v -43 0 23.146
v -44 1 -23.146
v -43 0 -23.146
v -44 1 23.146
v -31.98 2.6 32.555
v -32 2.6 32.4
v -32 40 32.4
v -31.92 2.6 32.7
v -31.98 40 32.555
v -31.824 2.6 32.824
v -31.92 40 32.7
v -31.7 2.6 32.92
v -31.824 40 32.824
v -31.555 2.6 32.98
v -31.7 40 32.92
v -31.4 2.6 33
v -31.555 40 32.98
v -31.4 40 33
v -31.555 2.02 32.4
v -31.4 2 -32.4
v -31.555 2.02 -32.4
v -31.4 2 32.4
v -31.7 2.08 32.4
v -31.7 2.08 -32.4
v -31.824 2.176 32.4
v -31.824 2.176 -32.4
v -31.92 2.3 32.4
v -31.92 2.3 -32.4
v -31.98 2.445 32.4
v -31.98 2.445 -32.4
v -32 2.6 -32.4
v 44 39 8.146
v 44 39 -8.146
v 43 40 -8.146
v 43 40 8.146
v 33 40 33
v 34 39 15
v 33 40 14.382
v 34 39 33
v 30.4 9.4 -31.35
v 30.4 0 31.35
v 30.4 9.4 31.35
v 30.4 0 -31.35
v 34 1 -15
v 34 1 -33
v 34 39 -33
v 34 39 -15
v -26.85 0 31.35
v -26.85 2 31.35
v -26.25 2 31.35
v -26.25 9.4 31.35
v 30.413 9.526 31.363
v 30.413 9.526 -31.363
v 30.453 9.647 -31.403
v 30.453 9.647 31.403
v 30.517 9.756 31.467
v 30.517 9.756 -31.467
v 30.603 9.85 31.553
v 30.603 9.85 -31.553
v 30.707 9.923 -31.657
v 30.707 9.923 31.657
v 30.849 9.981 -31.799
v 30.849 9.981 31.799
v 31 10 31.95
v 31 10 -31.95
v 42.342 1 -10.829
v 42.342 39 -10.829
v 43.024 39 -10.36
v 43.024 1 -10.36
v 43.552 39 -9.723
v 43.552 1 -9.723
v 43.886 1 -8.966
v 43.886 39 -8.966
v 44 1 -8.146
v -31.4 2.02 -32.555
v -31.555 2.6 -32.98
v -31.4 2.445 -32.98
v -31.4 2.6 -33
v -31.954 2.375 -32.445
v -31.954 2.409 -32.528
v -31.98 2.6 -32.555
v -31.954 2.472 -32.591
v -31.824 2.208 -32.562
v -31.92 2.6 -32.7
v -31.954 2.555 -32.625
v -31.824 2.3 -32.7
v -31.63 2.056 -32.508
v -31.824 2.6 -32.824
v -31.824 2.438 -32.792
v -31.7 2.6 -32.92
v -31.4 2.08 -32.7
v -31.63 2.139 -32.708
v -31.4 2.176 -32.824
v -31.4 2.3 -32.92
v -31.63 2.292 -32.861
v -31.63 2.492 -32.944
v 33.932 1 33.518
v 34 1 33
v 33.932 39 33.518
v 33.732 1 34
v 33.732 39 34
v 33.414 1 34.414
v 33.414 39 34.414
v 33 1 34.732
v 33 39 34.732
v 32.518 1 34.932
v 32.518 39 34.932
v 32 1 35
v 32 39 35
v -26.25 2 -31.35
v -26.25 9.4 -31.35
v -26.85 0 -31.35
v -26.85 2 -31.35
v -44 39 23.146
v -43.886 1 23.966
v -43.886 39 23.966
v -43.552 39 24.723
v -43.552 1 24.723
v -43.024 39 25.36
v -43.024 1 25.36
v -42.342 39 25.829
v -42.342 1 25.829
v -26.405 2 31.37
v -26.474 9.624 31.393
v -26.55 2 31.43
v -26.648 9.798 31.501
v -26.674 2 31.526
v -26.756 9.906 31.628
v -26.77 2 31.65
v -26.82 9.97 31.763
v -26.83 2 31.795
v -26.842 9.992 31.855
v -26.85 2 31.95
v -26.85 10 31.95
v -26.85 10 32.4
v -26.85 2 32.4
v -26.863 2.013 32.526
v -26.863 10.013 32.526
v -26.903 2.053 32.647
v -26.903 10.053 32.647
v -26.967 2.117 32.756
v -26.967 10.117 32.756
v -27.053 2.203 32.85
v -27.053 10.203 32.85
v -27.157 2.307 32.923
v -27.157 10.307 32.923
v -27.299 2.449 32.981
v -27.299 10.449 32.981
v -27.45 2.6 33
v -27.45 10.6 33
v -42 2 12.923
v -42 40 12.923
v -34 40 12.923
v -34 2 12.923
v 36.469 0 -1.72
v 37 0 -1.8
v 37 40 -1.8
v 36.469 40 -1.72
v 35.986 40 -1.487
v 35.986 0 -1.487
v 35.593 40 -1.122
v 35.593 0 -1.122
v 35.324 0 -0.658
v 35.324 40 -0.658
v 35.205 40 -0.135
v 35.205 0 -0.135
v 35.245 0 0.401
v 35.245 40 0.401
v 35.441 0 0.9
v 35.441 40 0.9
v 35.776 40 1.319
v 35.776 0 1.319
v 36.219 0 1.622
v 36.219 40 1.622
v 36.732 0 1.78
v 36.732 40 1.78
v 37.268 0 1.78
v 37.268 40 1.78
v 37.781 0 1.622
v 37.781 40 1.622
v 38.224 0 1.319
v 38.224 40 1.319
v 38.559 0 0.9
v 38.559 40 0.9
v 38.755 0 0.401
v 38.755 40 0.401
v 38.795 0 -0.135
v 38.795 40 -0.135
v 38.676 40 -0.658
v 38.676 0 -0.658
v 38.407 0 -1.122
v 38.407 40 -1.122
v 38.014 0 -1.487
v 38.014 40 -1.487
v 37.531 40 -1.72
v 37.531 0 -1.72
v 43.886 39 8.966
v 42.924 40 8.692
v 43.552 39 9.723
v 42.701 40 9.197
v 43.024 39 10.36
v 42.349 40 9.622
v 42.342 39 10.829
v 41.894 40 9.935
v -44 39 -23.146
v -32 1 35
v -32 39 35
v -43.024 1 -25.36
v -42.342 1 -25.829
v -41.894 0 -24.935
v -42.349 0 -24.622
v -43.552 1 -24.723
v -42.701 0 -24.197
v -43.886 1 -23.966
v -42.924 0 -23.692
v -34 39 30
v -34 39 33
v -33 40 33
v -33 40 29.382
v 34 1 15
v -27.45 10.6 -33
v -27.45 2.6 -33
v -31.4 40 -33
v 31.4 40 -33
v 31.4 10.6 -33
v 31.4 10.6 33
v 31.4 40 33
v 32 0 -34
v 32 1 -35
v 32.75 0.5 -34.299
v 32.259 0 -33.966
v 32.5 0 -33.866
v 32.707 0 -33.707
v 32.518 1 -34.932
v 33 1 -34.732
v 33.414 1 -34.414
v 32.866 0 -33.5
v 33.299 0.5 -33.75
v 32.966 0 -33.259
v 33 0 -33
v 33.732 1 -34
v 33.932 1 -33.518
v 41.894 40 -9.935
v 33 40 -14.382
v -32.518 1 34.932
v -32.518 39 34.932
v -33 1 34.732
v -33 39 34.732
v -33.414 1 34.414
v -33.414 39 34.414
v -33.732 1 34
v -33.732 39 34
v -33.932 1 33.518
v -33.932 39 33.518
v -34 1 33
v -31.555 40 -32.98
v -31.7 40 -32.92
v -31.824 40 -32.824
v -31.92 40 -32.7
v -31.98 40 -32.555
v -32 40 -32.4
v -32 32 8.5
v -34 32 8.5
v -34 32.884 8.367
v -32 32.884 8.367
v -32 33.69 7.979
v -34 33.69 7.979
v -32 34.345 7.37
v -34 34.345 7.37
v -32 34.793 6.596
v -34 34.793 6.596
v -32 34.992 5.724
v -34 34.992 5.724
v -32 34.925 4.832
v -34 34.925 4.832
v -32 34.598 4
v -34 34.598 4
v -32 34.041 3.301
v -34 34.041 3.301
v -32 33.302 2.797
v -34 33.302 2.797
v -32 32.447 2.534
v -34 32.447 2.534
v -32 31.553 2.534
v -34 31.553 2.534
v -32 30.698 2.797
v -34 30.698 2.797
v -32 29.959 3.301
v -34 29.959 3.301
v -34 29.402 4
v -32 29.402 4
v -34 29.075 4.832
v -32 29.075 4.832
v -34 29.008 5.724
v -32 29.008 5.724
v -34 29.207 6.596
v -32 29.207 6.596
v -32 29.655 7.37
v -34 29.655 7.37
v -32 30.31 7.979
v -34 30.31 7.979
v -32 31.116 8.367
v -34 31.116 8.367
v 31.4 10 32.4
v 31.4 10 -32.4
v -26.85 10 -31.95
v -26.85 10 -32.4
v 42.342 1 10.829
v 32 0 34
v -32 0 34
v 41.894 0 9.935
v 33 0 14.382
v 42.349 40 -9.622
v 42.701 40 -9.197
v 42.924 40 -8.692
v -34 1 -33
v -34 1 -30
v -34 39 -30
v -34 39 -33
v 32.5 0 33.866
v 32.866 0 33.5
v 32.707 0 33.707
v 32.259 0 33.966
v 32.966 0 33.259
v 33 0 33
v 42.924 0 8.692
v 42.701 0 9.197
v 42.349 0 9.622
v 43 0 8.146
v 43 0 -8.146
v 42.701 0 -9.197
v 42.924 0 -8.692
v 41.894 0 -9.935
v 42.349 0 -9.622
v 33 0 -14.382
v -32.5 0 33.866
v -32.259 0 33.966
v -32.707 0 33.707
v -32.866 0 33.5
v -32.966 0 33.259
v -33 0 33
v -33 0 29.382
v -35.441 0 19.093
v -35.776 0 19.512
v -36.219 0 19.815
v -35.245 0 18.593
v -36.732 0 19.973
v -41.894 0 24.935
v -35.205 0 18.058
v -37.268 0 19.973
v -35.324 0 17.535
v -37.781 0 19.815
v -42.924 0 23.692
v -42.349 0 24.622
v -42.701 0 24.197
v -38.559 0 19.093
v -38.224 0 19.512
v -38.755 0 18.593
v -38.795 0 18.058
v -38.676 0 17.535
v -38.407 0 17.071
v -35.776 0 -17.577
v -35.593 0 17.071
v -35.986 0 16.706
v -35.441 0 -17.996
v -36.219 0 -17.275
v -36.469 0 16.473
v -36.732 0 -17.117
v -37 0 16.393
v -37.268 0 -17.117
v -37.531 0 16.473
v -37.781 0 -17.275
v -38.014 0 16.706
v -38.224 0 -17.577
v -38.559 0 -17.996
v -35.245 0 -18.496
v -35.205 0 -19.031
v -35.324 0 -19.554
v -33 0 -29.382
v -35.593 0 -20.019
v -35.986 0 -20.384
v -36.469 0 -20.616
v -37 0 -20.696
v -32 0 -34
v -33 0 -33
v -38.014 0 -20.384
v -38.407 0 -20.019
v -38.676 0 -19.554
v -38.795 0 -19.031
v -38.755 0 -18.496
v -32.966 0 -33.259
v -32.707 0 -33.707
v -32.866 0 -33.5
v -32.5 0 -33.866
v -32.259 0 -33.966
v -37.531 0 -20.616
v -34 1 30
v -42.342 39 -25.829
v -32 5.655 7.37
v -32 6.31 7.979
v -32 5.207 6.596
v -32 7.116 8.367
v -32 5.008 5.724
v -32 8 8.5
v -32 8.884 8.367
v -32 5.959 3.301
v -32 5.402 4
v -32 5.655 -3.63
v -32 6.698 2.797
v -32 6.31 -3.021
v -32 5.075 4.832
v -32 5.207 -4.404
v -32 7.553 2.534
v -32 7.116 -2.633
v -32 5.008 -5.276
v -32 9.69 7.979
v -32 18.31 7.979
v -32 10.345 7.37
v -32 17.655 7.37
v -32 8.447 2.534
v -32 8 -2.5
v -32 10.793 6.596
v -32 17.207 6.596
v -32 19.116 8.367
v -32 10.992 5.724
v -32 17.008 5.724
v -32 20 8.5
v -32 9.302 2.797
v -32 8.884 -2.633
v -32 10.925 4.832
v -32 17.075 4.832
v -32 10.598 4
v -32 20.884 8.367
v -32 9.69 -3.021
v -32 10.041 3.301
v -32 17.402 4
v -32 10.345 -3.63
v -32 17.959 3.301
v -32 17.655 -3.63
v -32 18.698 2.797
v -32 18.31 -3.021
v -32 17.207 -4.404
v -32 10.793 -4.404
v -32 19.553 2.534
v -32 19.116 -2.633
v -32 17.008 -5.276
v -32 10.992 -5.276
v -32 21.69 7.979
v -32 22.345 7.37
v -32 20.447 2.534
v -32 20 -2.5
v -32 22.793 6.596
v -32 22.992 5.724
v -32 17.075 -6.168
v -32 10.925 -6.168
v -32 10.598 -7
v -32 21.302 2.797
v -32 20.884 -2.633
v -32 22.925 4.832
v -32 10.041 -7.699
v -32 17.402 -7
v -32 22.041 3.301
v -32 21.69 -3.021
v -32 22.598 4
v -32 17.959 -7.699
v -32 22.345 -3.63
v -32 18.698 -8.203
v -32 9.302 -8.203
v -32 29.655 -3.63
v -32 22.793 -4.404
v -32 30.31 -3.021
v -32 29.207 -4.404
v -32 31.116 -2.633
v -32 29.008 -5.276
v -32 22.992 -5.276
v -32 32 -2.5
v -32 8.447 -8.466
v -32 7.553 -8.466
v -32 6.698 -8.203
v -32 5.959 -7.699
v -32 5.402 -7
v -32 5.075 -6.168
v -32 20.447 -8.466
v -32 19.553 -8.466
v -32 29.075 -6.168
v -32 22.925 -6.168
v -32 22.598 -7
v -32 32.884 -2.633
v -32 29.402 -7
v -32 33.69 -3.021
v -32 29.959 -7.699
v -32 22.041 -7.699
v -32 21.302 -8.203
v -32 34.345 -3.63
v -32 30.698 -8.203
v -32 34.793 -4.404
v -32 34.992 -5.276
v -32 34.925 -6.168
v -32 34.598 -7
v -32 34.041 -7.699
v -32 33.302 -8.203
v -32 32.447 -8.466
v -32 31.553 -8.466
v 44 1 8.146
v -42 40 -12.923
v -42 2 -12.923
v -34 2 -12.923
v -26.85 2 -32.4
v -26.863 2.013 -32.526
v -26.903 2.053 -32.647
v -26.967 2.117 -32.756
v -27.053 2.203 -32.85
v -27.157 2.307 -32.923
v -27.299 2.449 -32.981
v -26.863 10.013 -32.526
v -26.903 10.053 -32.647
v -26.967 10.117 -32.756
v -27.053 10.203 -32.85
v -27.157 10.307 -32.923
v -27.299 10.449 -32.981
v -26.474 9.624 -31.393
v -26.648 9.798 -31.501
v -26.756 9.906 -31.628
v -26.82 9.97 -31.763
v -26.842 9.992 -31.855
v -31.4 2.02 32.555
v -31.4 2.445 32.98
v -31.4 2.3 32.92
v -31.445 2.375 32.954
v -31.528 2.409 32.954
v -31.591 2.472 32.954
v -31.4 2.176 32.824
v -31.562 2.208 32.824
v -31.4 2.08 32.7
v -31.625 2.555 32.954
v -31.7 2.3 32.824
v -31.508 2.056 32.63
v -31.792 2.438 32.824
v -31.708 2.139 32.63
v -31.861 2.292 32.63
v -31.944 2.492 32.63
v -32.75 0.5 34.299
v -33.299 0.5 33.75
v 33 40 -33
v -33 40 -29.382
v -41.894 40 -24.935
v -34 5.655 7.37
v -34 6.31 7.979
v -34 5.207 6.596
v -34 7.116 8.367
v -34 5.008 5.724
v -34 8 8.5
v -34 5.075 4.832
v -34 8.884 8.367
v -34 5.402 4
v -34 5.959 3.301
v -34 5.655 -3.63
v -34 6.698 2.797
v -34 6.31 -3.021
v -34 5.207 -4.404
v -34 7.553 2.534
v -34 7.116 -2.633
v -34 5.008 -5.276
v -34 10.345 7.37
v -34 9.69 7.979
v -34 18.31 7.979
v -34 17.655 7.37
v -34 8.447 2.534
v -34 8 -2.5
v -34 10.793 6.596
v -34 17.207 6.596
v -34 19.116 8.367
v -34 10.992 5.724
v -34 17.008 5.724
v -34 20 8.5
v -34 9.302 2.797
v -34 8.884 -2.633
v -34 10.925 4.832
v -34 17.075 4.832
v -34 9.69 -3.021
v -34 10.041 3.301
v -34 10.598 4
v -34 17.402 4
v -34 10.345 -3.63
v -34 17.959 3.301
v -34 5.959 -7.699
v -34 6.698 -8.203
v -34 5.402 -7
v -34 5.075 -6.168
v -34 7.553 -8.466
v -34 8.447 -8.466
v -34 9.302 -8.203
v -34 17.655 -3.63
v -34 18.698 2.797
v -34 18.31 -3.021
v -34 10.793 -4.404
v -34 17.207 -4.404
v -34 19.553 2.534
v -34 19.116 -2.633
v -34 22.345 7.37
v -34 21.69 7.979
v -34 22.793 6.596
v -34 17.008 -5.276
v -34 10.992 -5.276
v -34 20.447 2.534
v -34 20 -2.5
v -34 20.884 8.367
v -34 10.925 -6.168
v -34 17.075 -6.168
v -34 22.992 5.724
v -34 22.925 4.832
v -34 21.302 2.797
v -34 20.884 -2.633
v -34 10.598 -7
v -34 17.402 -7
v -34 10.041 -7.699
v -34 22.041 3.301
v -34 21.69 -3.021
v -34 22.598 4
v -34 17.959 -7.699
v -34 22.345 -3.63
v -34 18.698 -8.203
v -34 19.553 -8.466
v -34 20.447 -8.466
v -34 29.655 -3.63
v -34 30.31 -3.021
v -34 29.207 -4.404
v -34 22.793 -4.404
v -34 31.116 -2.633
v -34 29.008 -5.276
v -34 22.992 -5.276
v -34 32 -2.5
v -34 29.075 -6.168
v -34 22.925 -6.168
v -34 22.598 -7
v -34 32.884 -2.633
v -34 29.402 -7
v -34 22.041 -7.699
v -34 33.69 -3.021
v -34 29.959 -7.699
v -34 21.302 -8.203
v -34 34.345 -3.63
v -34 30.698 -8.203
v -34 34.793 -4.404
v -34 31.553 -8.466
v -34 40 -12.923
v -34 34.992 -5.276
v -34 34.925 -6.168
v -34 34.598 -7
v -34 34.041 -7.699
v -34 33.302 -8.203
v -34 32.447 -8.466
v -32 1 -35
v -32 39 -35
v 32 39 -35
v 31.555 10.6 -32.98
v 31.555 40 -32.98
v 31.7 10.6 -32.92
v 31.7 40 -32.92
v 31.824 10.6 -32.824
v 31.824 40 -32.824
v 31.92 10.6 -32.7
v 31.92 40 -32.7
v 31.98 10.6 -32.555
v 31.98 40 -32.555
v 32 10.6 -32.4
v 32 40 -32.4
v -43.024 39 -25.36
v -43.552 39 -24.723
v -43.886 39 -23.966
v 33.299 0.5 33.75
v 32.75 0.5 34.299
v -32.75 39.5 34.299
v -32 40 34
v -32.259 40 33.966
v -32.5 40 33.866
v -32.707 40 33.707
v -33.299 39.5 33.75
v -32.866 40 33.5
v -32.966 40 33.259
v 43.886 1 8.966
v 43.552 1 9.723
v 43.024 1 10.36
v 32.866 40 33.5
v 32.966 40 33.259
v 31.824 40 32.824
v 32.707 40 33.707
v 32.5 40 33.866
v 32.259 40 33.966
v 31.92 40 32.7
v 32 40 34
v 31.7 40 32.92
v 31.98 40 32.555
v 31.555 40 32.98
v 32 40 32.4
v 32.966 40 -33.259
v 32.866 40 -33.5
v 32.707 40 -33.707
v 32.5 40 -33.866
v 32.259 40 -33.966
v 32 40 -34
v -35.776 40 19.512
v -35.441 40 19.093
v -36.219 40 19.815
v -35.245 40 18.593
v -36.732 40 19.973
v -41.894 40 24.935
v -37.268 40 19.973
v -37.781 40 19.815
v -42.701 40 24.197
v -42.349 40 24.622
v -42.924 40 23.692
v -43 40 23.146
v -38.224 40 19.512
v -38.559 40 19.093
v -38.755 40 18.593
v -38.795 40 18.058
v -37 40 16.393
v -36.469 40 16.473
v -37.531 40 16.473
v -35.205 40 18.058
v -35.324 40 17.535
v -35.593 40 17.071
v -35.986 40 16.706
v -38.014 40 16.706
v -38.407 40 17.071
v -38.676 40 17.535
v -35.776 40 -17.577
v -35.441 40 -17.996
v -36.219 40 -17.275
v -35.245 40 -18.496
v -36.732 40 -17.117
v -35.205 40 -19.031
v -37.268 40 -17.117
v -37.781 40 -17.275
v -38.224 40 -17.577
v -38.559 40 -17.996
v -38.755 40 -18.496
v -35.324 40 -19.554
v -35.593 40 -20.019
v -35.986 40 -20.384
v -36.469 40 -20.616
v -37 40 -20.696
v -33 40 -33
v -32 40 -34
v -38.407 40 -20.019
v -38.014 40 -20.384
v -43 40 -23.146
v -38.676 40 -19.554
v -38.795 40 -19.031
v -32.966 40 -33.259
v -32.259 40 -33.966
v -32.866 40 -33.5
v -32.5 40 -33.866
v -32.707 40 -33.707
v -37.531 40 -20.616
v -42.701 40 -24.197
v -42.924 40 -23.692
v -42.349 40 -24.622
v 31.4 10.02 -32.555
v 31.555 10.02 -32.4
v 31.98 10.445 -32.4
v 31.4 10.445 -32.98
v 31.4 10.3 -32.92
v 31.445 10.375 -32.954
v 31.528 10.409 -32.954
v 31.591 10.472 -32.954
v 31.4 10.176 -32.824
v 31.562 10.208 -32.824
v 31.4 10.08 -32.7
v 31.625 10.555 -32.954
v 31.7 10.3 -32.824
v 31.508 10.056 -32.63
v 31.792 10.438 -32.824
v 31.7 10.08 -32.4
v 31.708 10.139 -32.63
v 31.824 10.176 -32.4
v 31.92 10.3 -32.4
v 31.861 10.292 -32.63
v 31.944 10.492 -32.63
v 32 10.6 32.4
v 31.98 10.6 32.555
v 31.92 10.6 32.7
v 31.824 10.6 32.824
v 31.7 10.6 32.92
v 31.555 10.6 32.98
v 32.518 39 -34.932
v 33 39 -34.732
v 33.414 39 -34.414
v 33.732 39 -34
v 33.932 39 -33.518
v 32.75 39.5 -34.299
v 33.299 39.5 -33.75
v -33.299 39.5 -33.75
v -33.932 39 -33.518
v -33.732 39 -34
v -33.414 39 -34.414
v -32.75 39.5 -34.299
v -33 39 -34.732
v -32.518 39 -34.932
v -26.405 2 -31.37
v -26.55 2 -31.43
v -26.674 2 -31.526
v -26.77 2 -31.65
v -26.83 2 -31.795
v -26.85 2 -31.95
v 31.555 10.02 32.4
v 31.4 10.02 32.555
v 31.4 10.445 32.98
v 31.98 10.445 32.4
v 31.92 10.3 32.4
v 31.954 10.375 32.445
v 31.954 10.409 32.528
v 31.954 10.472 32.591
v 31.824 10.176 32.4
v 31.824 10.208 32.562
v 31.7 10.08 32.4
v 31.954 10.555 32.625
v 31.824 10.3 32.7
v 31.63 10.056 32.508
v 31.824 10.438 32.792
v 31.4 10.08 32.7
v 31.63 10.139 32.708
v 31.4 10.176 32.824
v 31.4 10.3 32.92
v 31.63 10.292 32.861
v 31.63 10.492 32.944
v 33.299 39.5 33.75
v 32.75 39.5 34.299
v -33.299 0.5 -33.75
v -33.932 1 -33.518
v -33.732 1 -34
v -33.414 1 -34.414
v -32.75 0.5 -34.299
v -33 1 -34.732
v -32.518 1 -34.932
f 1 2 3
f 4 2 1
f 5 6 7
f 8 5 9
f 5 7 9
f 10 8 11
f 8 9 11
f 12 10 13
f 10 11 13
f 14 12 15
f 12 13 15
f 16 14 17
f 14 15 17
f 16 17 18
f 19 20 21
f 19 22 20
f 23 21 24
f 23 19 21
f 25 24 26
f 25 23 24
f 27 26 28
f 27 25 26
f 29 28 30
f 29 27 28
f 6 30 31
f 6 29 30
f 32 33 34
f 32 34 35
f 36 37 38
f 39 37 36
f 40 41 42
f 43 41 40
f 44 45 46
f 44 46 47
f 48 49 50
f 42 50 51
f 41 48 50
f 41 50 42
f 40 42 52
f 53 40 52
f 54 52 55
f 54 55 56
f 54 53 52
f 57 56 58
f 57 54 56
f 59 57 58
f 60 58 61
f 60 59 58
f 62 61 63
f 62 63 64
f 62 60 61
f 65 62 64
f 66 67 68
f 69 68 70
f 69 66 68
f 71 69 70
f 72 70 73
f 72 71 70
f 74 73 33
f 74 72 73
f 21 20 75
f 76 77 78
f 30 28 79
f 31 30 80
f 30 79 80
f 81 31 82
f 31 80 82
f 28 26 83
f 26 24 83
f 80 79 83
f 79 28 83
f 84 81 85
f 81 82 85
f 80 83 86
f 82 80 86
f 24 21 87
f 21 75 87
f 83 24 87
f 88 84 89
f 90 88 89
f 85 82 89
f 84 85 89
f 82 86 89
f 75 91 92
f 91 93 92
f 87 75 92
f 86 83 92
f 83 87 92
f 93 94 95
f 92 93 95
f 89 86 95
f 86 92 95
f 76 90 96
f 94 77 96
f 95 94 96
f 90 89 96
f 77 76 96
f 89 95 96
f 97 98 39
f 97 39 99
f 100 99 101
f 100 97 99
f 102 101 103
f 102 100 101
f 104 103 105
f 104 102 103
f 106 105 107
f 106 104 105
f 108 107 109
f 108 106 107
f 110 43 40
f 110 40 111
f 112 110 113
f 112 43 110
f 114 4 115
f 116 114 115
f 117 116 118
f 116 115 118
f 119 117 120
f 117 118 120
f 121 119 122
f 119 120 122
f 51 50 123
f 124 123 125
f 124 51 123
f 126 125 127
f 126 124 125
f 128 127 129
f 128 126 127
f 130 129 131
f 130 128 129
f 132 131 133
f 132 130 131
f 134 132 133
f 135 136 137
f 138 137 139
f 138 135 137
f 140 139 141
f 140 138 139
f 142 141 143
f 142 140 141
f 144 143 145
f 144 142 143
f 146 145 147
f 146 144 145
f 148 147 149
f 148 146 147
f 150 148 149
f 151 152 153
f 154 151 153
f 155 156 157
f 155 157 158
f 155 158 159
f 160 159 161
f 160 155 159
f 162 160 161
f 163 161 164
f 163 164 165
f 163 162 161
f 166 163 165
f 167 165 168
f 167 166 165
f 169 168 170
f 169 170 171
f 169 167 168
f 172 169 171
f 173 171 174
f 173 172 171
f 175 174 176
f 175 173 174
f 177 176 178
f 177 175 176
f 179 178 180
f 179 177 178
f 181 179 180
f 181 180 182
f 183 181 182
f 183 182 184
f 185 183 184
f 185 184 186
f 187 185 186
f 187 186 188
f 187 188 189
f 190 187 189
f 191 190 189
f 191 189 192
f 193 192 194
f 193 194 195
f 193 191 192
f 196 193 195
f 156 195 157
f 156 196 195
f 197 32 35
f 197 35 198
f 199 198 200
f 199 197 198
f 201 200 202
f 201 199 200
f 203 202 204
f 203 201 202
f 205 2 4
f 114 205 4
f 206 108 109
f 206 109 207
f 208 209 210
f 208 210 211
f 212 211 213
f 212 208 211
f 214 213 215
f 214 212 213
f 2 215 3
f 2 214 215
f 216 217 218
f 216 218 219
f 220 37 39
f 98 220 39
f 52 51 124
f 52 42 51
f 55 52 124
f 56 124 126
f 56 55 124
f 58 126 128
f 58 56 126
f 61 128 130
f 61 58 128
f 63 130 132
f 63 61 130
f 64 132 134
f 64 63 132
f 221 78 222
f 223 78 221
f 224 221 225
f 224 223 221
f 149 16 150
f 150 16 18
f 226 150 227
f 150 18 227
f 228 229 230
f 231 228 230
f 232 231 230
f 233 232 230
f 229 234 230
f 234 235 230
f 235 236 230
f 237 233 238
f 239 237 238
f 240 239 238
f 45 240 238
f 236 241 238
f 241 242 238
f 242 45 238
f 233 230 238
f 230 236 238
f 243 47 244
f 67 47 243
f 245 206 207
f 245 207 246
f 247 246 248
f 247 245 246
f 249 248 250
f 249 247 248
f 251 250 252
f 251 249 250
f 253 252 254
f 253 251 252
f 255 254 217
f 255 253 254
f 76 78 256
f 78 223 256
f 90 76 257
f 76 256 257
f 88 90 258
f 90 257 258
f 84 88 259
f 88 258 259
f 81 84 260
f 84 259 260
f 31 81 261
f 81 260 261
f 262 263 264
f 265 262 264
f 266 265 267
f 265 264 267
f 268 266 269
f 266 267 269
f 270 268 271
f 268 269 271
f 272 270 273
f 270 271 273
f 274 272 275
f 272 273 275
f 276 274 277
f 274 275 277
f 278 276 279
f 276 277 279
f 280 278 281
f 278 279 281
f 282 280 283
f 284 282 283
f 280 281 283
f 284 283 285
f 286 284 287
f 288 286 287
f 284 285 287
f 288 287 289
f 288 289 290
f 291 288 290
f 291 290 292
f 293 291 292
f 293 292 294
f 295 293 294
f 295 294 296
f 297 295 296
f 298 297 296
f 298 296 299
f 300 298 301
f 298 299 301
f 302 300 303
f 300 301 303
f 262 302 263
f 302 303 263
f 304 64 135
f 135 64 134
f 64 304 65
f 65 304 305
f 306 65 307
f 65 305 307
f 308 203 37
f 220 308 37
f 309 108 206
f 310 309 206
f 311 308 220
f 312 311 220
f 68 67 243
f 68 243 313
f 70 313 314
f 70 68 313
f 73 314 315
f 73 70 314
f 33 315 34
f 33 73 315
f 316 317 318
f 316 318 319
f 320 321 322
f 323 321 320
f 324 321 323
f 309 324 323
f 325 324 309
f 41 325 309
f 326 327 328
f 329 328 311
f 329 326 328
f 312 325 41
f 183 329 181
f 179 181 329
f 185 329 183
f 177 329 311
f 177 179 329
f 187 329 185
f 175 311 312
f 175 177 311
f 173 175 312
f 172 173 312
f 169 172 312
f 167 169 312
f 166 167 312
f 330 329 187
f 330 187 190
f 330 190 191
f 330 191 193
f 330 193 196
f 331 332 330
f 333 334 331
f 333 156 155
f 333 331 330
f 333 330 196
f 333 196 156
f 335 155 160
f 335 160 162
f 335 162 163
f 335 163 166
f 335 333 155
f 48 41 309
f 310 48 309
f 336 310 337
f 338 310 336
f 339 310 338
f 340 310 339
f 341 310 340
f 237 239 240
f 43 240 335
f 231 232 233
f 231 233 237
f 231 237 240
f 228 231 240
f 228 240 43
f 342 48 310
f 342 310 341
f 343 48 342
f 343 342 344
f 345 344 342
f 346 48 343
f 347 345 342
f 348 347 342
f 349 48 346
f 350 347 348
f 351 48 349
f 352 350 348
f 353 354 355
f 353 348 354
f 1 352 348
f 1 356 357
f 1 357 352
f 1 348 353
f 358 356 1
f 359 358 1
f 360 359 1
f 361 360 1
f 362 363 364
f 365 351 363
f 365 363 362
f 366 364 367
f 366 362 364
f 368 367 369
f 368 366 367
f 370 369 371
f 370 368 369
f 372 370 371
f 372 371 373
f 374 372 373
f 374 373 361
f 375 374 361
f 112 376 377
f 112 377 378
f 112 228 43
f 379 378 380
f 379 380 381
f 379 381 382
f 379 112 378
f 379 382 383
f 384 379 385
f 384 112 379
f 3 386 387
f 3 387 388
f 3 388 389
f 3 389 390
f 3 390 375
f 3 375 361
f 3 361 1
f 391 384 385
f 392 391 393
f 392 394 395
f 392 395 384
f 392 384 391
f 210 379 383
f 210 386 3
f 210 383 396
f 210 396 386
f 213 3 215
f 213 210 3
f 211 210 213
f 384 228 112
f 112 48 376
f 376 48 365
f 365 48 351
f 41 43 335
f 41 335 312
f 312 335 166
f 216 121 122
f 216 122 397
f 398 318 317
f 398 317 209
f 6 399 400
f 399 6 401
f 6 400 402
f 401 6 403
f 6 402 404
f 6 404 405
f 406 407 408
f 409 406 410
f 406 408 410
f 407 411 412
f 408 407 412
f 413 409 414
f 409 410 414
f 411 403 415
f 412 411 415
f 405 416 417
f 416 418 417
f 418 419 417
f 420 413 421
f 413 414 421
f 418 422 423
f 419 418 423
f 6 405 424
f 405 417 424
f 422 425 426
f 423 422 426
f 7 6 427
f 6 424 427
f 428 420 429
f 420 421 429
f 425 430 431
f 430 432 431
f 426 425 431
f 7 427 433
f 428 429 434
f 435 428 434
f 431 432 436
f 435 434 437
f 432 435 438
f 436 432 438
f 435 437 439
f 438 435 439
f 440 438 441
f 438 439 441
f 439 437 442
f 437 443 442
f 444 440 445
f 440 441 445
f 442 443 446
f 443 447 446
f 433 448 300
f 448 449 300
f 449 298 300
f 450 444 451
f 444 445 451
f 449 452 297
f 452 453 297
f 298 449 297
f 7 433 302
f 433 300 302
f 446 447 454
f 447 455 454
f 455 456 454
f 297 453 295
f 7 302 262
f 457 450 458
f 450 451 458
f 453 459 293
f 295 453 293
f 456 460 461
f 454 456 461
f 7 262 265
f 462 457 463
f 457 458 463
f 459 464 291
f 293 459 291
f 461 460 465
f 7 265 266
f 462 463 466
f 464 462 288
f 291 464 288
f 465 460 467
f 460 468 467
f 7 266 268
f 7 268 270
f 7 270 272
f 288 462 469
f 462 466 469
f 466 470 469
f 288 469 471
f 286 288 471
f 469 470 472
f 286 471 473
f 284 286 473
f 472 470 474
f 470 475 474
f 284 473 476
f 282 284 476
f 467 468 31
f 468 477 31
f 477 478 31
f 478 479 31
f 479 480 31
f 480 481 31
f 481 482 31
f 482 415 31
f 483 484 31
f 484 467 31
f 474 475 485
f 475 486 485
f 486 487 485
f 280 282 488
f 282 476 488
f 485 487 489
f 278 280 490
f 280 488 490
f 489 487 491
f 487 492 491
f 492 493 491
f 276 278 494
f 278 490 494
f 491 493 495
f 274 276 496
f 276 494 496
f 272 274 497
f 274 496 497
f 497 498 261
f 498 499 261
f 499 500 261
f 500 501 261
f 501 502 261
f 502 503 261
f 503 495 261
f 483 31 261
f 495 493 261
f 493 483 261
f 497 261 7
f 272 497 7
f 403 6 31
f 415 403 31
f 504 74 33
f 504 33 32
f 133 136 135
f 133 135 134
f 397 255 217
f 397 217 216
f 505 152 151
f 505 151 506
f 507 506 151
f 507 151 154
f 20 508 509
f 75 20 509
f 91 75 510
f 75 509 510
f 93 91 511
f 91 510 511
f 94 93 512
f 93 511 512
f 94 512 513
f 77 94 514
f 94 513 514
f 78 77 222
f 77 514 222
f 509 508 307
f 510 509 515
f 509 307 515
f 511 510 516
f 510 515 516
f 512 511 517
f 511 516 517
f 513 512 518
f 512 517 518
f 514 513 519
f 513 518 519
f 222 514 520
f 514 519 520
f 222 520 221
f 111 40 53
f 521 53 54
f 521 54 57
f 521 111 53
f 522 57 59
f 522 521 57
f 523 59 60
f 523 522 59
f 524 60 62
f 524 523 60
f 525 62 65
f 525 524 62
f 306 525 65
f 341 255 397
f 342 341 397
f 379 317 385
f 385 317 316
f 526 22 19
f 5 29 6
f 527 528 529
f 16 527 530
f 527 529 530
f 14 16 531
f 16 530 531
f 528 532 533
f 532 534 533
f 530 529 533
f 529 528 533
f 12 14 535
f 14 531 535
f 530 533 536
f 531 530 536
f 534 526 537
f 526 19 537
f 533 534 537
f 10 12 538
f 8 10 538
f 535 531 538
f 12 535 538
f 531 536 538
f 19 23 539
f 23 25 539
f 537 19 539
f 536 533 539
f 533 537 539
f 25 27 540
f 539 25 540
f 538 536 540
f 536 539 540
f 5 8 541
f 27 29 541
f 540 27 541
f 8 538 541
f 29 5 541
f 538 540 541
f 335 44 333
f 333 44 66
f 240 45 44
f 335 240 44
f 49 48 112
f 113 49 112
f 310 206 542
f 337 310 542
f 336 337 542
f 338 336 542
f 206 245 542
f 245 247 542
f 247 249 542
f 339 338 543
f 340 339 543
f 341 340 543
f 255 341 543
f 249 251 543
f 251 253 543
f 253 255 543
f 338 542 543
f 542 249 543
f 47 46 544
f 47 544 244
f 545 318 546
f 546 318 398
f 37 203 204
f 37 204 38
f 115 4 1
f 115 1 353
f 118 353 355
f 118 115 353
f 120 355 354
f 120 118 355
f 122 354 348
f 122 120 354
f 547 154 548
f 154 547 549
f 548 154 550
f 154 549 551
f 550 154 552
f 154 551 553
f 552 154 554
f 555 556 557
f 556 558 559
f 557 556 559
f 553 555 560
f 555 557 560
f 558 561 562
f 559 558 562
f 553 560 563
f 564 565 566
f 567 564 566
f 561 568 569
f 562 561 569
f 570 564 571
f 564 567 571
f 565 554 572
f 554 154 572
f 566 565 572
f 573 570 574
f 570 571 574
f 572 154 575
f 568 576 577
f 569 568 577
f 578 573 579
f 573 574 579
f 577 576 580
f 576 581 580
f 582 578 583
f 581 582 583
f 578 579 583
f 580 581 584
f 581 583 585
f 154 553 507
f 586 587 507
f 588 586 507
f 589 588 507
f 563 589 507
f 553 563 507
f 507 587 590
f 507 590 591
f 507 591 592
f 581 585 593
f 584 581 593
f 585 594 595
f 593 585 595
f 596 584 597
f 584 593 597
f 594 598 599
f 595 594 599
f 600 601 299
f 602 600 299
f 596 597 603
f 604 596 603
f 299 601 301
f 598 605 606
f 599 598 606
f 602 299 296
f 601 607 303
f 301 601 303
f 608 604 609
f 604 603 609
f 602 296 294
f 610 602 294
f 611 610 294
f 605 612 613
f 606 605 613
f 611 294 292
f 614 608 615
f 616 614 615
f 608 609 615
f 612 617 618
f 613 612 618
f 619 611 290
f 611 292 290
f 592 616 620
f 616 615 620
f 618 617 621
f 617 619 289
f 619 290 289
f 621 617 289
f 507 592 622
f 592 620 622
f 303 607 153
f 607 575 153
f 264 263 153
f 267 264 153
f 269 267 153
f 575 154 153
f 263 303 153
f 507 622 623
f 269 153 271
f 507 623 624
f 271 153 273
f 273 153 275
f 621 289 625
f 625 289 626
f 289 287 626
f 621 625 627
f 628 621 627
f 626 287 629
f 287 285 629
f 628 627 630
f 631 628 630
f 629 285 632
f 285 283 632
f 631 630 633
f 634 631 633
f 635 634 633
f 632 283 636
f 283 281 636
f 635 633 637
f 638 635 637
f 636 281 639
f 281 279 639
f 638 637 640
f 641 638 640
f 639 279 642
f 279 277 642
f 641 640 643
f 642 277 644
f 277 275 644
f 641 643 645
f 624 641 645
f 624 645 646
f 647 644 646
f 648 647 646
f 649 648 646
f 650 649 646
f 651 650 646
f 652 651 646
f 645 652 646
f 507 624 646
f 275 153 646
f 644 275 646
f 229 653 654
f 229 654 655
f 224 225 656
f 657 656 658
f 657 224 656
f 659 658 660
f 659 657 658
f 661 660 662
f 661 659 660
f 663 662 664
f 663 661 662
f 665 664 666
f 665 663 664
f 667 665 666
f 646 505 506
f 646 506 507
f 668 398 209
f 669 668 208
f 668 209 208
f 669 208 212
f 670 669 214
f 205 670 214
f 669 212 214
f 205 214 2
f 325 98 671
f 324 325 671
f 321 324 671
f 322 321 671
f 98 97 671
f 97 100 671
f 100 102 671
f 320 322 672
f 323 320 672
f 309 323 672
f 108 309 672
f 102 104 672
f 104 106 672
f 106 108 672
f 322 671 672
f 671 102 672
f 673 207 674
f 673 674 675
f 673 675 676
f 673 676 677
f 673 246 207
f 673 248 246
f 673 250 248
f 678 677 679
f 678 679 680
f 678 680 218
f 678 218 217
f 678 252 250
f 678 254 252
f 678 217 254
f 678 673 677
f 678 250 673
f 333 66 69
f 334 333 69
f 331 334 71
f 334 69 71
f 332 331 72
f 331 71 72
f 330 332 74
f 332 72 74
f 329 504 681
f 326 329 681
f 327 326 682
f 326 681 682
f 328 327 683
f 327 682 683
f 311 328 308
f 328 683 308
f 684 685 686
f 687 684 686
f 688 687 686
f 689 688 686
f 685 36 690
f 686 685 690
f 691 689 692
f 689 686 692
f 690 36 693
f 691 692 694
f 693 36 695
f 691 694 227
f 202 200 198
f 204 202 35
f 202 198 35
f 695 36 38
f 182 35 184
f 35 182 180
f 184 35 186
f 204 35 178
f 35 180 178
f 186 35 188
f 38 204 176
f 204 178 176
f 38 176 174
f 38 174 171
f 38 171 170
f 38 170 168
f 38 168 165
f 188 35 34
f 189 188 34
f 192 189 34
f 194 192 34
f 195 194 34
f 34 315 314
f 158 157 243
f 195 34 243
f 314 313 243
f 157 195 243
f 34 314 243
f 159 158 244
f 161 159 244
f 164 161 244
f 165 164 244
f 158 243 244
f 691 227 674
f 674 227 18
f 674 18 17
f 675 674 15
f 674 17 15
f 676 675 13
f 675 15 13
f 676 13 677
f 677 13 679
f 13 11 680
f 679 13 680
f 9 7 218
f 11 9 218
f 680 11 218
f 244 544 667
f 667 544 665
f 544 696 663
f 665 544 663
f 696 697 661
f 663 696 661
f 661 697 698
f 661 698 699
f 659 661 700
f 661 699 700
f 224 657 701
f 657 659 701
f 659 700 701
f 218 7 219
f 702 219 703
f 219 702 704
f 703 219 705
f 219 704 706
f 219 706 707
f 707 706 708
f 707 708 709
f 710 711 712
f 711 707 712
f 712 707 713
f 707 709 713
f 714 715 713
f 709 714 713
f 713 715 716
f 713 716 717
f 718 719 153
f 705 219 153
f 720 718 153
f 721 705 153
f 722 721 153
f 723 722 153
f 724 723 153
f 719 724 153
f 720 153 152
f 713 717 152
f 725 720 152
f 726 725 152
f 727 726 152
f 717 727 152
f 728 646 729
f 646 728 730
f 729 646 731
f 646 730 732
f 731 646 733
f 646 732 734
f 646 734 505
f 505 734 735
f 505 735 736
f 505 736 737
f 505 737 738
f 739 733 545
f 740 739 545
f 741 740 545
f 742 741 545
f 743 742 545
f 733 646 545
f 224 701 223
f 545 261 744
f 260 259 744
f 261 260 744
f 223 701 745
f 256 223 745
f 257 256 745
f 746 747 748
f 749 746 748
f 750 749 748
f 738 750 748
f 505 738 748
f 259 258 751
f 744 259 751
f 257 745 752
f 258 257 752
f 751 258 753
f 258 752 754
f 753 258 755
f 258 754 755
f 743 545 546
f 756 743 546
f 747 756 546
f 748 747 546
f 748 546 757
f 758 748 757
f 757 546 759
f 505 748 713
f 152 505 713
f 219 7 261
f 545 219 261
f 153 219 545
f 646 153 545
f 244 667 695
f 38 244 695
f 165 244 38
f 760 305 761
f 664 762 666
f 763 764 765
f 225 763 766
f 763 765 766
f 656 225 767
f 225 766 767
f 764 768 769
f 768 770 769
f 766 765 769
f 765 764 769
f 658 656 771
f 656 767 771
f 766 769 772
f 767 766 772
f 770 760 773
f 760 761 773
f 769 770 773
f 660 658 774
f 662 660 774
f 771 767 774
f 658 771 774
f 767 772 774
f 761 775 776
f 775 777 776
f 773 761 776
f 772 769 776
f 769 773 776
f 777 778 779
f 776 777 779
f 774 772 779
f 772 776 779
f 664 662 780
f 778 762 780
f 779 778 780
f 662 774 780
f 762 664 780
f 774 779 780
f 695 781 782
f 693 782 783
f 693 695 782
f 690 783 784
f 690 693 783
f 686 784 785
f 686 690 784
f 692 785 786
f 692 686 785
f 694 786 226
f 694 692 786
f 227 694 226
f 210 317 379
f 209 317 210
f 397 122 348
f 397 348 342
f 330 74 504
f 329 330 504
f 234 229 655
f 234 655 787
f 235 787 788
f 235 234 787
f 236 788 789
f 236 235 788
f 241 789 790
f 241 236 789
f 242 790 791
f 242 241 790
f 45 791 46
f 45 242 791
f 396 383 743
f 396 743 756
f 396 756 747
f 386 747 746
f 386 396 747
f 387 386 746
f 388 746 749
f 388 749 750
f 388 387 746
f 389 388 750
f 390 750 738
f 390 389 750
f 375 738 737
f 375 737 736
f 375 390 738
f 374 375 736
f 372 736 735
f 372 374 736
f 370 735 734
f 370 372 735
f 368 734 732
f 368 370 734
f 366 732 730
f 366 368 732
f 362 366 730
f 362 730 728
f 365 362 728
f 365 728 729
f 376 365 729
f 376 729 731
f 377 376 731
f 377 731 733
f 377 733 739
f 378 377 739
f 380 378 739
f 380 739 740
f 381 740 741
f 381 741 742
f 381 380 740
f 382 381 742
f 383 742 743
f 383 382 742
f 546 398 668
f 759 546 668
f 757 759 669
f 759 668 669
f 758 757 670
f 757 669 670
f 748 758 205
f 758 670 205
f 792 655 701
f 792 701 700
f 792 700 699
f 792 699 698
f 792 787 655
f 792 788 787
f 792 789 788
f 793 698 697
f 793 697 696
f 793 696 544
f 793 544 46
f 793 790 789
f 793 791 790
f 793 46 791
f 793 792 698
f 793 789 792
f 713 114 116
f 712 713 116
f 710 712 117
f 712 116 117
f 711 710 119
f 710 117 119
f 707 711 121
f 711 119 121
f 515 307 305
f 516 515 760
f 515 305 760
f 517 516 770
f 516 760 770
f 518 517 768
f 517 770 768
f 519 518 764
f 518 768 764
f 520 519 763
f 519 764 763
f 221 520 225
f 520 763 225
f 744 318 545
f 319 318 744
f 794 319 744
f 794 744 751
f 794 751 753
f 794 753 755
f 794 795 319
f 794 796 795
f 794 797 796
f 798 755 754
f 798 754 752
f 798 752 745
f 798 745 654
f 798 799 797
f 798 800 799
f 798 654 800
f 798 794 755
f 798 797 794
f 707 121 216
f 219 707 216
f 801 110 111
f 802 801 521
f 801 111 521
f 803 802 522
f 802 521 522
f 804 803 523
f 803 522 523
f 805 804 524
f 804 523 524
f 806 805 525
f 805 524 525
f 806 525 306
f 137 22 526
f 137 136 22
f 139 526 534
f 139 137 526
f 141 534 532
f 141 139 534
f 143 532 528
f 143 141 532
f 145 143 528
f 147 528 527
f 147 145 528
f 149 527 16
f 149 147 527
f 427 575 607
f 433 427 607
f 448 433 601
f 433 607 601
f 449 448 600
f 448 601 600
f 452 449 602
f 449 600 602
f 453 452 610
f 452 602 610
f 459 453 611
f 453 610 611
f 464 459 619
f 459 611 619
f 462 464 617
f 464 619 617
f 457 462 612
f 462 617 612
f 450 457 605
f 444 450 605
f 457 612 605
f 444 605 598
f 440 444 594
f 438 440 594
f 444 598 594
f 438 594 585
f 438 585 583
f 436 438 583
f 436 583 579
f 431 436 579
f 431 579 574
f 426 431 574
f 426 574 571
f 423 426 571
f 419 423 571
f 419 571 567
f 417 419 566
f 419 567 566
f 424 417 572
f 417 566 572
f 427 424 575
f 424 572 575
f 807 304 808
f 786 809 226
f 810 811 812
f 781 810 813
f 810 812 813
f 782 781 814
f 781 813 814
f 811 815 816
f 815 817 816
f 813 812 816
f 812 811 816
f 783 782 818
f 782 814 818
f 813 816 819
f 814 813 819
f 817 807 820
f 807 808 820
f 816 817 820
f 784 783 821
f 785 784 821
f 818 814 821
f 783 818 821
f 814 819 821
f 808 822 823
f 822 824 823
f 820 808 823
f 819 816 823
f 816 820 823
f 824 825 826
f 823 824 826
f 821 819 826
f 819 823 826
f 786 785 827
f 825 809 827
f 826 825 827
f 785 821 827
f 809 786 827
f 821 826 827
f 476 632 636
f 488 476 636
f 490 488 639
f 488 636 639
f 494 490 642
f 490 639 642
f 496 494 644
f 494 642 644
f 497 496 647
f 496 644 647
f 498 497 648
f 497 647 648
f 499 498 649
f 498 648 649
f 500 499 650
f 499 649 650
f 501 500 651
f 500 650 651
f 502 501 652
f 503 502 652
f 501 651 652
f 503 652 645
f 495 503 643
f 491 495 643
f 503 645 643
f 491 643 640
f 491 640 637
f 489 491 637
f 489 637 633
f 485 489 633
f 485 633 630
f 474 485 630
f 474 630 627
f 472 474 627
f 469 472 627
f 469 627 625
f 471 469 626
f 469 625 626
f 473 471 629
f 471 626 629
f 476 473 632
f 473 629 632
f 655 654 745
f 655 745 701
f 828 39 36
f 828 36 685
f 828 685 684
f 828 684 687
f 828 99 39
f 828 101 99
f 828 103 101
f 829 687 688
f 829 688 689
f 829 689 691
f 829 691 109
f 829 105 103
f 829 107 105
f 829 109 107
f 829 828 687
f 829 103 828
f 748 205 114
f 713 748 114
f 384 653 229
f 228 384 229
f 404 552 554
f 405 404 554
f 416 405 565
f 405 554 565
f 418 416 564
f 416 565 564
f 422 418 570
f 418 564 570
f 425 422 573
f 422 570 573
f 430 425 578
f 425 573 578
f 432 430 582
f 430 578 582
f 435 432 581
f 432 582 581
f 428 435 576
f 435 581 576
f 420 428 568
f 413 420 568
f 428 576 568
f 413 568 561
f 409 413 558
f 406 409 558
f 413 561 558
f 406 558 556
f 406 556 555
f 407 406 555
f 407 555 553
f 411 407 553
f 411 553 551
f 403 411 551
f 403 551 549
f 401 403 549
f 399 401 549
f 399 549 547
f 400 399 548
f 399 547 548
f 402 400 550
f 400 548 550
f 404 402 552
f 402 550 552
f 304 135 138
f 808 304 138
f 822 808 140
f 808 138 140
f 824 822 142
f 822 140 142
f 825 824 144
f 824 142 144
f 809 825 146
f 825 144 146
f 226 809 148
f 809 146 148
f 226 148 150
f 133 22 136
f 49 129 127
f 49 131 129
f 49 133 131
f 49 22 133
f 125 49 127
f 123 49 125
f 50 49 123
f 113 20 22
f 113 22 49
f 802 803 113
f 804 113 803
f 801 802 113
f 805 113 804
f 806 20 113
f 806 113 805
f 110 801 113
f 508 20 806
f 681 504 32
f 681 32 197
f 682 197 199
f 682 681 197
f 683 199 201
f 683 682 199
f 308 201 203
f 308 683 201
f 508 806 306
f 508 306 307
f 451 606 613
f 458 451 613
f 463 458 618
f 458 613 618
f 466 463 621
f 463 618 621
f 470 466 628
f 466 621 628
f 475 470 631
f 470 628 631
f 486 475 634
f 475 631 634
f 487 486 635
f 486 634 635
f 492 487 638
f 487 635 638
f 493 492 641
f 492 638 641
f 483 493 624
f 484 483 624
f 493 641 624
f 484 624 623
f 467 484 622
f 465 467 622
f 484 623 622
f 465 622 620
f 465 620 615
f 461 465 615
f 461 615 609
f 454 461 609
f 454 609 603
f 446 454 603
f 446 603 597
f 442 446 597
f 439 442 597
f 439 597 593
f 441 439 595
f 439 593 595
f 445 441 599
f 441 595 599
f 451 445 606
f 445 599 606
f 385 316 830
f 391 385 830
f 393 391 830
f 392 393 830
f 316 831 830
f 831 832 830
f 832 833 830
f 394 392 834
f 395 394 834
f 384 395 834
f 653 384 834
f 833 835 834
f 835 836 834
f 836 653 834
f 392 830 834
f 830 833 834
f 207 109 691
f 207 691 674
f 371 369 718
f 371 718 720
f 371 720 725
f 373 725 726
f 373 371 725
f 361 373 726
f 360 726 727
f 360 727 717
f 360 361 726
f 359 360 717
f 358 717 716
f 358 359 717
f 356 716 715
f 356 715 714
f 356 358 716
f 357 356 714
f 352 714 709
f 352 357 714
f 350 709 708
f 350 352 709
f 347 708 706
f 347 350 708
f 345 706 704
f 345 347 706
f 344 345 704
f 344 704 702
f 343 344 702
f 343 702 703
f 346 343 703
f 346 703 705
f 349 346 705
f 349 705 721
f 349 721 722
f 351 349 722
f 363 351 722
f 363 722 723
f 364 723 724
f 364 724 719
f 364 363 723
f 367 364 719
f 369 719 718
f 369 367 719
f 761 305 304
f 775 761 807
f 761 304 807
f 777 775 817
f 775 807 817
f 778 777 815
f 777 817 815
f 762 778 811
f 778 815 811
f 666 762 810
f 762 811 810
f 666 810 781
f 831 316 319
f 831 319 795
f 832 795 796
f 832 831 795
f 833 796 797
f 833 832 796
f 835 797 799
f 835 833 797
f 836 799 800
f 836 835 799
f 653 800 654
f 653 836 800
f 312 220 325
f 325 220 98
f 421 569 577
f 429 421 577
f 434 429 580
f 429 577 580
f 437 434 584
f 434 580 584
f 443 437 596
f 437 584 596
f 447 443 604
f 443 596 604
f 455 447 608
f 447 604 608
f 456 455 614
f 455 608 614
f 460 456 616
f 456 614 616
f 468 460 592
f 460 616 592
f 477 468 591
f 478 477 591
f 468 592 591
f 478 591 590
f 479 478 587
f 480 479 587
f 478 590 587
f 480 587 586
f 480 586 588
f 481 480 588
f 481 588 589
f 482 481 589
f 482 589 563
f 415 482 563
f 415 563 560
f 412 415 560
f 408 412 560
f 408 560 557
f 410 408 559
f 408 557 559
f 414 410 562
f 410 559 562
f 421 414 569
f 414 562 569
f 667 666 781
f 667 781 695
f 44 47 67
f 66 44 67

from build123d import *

# Parameters (mm, degrees)
BOSS_EXTRUDE1_DEPTH = 40
SHELL1_START        = -33
SHELL1_OUTLINE_W    = 64
SHELL1_OUTLINE_H    = 38
SHELL1_DEPTH        = 66
SKETCH2_R           = 1.8
BOSS_EXTRUDE2_DEPTH = 40
CUT_EXTRUDE1_START  = 40
SKETCH3_W           = 8
SKETCH3_H           = 25.845374508
CUT_EXTRUDE1_DEPTH  = 38
SKETCH4_R           = 3
CUT_EXTRUDE2_DEPTH  = 2
SKETCH5_W           = 57.25
SKETCH5_H           = 62.7
CUT_EXTRUDE3_DEPTH  = 2
BOSS_EXTRUDE3_DEPTH = 8
CHAMFER1_SIZE       = 1
FILLET1_R           = 0.6


# Read off the part's stored shape, not the designer's step: Shell1
with BuildPart() as part:
    # Sketch1 → Boss-Extrude1 (new body)
    with BuildSketch(Plane(origin=(0, 0, 0), x_dir=(1, 0, 0), z_dir=(0, 1, 0))):
        with BuildLine():
            Line((-32, 35), (32, 35))
            ThreePointArc((32, 35), (33.414213562, 34.414213562), (34, 33))
            Line((34, 33), (34, -33))
            ThreePointArc((34, -33), (33.414213562, -34.414213562), (32, -35))
            Line((32, -35), (-32, -35))
            ThreePointArc((-32, -35), (-33.414213562, -34.414213562), (-34, -33))
            Line((-34, -33), (-34, 33))
            ThreePointArc((-34, 33), (-33.414213562, 34.414213562), (-32, 35))
        make_face()
    extrude(amount=BOSS_EXTRUDE1_DEPTH)

    # Shell1 outline → Shell1 (cut)
    with BuildSketch(Plane.XY.offset(SHELL1_START)):
        with Locations((0, 21)):
            Rectangle(SHELL1_OUTLINE_W, SHELL1_OUTLINE_H)
    extrude(amount=SHELL1_DEPTH, mode=Mode.SUBTRACT)

    # Sketch2 → Boss-Extrude2 (add)
    # profile 1 of 2: a face of its own
    with BuildSketch(Plane(origin=(0, 0, 0), x_dir=(1, 0, 0), z_dir=(0, 1, 0))):
        with BuildLine():
            Line((-34, 30), (-42.341640786, 25.829179607))
            ThreePointArc((-42.341640786, 25.829179607), (-43.551952425, 24.72309137), (-44, 23.145898034))
            Line((-44, 23.145898034), (-44, -23.145898034))
            ThreePointArc((-44, -23.145898034), (-43.551952425, -24.72309137), (-42.341640786, -25.829179607))
            Line((-42.341640786, -25.829179607), (-34, -30))
            Line((-34, -30), (-34, 30))
        make_face()
        with Locations(Location((-37, 18.896413475, 0), (0, 0, 90))):
            Circle(SKETCH2_R, mode=Mode.SUBTRACT)
        with Locations(Location((-37, -18.192906379, 0), (0, 0, 90))):
            Circle(SKETCH2_R, mode=Mode.SUBTRACT)
    # profile 2 of 2: a face of its own
    with BuildSketch(Plane(origin=(0, 0, 0), x_dir=(1, 0, 0), z_dir=(0, 1, 0))):
        with BuildLine():
            Line((34, 15), (42.341640786, 10.829179607))
            ThreePointArc((42.341640786, 10.829179607), (43.551952425, 9.72309137), (44, 8.145898034))
            Line((44, 8.145898034), (44, -8.145898034))
            ThreePointArc((44, -8.145898034), (43.551952425, -9.72309137), (42.341640786, -10.829179607))
            Line((42.341640786, -10.829179607), (34, -15))
            Line((34, -15), (34, 15))
        make_face()
        with Locations(Location((37, 0, 0), (0, 0, 90))):
            Circle(SKETCH2_R, mode=Mode.SUBTRACT)
    extrude(amount=BOSS_EXTRUDE2_DEPTH)

    # Sketch3 → Cut-Extrude1 (cut)
    with BuildSketch(Plane(origin=(0, 0, 0), x_dir=(1, 0, 0), z_dir=(0, 1, 0)).offset(CUT_EXTRUDE1_START)):
        with Locations((-38, 0)):
            Rectangle(SKETCH3_W, SKETCH3_H)
    extrude(amount=-CUT_EXTRUDE1_DEPTH, mode=Mode.SUBTRACT)

    # Sketch4 → Cut-Extrude2 (cut)
    with BuildSketch(Plane.ZY.offset(34)):
        with Locations((-5.5, 32)):
            Circle(SKETCH4_R)
        with Locations((5.5, 32)):
            Circle(SKETCH4_R)
        with Locations((-5.5, 20)):
            Circle(SKETCH4_R)
        with Locations((5.5, 20)):
            Circle(SKETCH4_R)
        with Locations((-5.5, 8)):
            Circle(SKETCH4_R)
        with Locations((5.5, 8)):
            Circle(SKETCH4_R)
    extrude(amount=-CUT_EXTRUDE2_DEPTH, mode=Mode.SUBTRACT)

    # Sketch5 → Cut-Extrude3 (cut)
    with BuildSketch(Plane(origin=(0, 0, 0), x_dir=(1, 0, 0), z_dir=(0, 1, 0))):
        with Locations((1.775, 0)):
            Rectangle(SKETCH5_W, SKETCH5_H)
    extrude(amount=CUT_EXTRUDE3_DEPTH, mode=Mode.SUBTRACT)

    # Sketch6 → Boss-Extrude3 (add)
    with BuildSketch(Plane(origin=(0, 2, 0), x_dir=(1, 0, 0), z_dir=(0, 1, 0))):
        Polygon((-26.85, 31.35), (-26.85, 33), (32, 33), (32, -33), (-26.85, -33), (-26.85, -31.35), (30.4, -31.35), (30.4, 31.35), align=None)
    extrude(amount=BOSS_EXTRUDE3_DEPTH)

    # Chamfer1
    chamfer1_edges = [part.edges().sort_by_distance(p)[0] for p in [
        (-34, 0, -31.5),
        (-33.414213562, 0, -34.414213562),
        (0, 0, -35),
        (33.414213562, 0, -34.414213562),
        (-33.414213562, 40, -34.414213562),
        (-34, 40, -31.5),
        (-33.414213562, 40, 34.414213562),
        (0, 40, 35),
        (33.414213562, 40, 34.414213562),
        (34, 40, 24),
        (-34, 0, 31.5),
        (-34, 40, 31.5),
        (-38.170820393, 40, -27.914589803),
        (-38.170820393, 0, -27.914589803),
        (-43.551952425, 40, -24.72309137),
        (-43.551952425, 0, -24.72309137),
        (-44, 40, 0),
        (-44, 0, 0),
        (-43.551952425, 40, 24.72309137),
        (-43.551952425, 0, 24.72309137),
        (-38.170820393, 40, 27.914589803),
        (-38.170820393, 0, 27.914589803),
        (33.414213562, 40, -34.414213562),
        (34, 0, -24),
        (34, 40, -24),
        (38.170820393, 40, 12.914589803),
        (38.170820393, 0, 12.914589803),
        (43.551952425, 40, 9.72309137),
        (43.551952425, 0, 9.72309137),
        (44, 40, 0),
        (44, 0, 0),
        (43.551952425, 40, -9.72309137),
        (43.551952425, 0, -9.72309137),
        (38.170820393, 40, -12.914589803),
        (38.170820393, 0, -12.914589803),
        (34, 0, 24),
        (0, 40, -35),
        (33.414213562, 0, 34.414213562),
        (0, 0, 35),
        (-33.414213562, 0, 34.414213562),
    ]]
    chamfer(chamfer1_edges, length=CHAMFER1_SIZE)

    # Fillet1
    fillet1_edges = [part.edges().sort_by_distance(p)[0] for p in [
        (-29.425, 2, -33),
        (-26.85, 6, -31.35),
        (-26.85, 6, 31.35),
        (-26.85, 6, 33),
        (-26.85, 6, -33),
        (1.775, 10, -31.35),
        (30.4, 10, 0),
        (1.775, 10, 31.35),
        (2.575, 10, 33),
        (32, 10, 0),
        (2.575, 10, -33),
        (32, 25, -33),
        (-32, 2, 0),
        (-32, 21, -33),
        (-29.425, 2, 33),
        (-32, 21, 33),
        (32, 25, 33),
    ]]
    fillet(fillet1_edges, radius=FILLET1_R)


solid = part.part
